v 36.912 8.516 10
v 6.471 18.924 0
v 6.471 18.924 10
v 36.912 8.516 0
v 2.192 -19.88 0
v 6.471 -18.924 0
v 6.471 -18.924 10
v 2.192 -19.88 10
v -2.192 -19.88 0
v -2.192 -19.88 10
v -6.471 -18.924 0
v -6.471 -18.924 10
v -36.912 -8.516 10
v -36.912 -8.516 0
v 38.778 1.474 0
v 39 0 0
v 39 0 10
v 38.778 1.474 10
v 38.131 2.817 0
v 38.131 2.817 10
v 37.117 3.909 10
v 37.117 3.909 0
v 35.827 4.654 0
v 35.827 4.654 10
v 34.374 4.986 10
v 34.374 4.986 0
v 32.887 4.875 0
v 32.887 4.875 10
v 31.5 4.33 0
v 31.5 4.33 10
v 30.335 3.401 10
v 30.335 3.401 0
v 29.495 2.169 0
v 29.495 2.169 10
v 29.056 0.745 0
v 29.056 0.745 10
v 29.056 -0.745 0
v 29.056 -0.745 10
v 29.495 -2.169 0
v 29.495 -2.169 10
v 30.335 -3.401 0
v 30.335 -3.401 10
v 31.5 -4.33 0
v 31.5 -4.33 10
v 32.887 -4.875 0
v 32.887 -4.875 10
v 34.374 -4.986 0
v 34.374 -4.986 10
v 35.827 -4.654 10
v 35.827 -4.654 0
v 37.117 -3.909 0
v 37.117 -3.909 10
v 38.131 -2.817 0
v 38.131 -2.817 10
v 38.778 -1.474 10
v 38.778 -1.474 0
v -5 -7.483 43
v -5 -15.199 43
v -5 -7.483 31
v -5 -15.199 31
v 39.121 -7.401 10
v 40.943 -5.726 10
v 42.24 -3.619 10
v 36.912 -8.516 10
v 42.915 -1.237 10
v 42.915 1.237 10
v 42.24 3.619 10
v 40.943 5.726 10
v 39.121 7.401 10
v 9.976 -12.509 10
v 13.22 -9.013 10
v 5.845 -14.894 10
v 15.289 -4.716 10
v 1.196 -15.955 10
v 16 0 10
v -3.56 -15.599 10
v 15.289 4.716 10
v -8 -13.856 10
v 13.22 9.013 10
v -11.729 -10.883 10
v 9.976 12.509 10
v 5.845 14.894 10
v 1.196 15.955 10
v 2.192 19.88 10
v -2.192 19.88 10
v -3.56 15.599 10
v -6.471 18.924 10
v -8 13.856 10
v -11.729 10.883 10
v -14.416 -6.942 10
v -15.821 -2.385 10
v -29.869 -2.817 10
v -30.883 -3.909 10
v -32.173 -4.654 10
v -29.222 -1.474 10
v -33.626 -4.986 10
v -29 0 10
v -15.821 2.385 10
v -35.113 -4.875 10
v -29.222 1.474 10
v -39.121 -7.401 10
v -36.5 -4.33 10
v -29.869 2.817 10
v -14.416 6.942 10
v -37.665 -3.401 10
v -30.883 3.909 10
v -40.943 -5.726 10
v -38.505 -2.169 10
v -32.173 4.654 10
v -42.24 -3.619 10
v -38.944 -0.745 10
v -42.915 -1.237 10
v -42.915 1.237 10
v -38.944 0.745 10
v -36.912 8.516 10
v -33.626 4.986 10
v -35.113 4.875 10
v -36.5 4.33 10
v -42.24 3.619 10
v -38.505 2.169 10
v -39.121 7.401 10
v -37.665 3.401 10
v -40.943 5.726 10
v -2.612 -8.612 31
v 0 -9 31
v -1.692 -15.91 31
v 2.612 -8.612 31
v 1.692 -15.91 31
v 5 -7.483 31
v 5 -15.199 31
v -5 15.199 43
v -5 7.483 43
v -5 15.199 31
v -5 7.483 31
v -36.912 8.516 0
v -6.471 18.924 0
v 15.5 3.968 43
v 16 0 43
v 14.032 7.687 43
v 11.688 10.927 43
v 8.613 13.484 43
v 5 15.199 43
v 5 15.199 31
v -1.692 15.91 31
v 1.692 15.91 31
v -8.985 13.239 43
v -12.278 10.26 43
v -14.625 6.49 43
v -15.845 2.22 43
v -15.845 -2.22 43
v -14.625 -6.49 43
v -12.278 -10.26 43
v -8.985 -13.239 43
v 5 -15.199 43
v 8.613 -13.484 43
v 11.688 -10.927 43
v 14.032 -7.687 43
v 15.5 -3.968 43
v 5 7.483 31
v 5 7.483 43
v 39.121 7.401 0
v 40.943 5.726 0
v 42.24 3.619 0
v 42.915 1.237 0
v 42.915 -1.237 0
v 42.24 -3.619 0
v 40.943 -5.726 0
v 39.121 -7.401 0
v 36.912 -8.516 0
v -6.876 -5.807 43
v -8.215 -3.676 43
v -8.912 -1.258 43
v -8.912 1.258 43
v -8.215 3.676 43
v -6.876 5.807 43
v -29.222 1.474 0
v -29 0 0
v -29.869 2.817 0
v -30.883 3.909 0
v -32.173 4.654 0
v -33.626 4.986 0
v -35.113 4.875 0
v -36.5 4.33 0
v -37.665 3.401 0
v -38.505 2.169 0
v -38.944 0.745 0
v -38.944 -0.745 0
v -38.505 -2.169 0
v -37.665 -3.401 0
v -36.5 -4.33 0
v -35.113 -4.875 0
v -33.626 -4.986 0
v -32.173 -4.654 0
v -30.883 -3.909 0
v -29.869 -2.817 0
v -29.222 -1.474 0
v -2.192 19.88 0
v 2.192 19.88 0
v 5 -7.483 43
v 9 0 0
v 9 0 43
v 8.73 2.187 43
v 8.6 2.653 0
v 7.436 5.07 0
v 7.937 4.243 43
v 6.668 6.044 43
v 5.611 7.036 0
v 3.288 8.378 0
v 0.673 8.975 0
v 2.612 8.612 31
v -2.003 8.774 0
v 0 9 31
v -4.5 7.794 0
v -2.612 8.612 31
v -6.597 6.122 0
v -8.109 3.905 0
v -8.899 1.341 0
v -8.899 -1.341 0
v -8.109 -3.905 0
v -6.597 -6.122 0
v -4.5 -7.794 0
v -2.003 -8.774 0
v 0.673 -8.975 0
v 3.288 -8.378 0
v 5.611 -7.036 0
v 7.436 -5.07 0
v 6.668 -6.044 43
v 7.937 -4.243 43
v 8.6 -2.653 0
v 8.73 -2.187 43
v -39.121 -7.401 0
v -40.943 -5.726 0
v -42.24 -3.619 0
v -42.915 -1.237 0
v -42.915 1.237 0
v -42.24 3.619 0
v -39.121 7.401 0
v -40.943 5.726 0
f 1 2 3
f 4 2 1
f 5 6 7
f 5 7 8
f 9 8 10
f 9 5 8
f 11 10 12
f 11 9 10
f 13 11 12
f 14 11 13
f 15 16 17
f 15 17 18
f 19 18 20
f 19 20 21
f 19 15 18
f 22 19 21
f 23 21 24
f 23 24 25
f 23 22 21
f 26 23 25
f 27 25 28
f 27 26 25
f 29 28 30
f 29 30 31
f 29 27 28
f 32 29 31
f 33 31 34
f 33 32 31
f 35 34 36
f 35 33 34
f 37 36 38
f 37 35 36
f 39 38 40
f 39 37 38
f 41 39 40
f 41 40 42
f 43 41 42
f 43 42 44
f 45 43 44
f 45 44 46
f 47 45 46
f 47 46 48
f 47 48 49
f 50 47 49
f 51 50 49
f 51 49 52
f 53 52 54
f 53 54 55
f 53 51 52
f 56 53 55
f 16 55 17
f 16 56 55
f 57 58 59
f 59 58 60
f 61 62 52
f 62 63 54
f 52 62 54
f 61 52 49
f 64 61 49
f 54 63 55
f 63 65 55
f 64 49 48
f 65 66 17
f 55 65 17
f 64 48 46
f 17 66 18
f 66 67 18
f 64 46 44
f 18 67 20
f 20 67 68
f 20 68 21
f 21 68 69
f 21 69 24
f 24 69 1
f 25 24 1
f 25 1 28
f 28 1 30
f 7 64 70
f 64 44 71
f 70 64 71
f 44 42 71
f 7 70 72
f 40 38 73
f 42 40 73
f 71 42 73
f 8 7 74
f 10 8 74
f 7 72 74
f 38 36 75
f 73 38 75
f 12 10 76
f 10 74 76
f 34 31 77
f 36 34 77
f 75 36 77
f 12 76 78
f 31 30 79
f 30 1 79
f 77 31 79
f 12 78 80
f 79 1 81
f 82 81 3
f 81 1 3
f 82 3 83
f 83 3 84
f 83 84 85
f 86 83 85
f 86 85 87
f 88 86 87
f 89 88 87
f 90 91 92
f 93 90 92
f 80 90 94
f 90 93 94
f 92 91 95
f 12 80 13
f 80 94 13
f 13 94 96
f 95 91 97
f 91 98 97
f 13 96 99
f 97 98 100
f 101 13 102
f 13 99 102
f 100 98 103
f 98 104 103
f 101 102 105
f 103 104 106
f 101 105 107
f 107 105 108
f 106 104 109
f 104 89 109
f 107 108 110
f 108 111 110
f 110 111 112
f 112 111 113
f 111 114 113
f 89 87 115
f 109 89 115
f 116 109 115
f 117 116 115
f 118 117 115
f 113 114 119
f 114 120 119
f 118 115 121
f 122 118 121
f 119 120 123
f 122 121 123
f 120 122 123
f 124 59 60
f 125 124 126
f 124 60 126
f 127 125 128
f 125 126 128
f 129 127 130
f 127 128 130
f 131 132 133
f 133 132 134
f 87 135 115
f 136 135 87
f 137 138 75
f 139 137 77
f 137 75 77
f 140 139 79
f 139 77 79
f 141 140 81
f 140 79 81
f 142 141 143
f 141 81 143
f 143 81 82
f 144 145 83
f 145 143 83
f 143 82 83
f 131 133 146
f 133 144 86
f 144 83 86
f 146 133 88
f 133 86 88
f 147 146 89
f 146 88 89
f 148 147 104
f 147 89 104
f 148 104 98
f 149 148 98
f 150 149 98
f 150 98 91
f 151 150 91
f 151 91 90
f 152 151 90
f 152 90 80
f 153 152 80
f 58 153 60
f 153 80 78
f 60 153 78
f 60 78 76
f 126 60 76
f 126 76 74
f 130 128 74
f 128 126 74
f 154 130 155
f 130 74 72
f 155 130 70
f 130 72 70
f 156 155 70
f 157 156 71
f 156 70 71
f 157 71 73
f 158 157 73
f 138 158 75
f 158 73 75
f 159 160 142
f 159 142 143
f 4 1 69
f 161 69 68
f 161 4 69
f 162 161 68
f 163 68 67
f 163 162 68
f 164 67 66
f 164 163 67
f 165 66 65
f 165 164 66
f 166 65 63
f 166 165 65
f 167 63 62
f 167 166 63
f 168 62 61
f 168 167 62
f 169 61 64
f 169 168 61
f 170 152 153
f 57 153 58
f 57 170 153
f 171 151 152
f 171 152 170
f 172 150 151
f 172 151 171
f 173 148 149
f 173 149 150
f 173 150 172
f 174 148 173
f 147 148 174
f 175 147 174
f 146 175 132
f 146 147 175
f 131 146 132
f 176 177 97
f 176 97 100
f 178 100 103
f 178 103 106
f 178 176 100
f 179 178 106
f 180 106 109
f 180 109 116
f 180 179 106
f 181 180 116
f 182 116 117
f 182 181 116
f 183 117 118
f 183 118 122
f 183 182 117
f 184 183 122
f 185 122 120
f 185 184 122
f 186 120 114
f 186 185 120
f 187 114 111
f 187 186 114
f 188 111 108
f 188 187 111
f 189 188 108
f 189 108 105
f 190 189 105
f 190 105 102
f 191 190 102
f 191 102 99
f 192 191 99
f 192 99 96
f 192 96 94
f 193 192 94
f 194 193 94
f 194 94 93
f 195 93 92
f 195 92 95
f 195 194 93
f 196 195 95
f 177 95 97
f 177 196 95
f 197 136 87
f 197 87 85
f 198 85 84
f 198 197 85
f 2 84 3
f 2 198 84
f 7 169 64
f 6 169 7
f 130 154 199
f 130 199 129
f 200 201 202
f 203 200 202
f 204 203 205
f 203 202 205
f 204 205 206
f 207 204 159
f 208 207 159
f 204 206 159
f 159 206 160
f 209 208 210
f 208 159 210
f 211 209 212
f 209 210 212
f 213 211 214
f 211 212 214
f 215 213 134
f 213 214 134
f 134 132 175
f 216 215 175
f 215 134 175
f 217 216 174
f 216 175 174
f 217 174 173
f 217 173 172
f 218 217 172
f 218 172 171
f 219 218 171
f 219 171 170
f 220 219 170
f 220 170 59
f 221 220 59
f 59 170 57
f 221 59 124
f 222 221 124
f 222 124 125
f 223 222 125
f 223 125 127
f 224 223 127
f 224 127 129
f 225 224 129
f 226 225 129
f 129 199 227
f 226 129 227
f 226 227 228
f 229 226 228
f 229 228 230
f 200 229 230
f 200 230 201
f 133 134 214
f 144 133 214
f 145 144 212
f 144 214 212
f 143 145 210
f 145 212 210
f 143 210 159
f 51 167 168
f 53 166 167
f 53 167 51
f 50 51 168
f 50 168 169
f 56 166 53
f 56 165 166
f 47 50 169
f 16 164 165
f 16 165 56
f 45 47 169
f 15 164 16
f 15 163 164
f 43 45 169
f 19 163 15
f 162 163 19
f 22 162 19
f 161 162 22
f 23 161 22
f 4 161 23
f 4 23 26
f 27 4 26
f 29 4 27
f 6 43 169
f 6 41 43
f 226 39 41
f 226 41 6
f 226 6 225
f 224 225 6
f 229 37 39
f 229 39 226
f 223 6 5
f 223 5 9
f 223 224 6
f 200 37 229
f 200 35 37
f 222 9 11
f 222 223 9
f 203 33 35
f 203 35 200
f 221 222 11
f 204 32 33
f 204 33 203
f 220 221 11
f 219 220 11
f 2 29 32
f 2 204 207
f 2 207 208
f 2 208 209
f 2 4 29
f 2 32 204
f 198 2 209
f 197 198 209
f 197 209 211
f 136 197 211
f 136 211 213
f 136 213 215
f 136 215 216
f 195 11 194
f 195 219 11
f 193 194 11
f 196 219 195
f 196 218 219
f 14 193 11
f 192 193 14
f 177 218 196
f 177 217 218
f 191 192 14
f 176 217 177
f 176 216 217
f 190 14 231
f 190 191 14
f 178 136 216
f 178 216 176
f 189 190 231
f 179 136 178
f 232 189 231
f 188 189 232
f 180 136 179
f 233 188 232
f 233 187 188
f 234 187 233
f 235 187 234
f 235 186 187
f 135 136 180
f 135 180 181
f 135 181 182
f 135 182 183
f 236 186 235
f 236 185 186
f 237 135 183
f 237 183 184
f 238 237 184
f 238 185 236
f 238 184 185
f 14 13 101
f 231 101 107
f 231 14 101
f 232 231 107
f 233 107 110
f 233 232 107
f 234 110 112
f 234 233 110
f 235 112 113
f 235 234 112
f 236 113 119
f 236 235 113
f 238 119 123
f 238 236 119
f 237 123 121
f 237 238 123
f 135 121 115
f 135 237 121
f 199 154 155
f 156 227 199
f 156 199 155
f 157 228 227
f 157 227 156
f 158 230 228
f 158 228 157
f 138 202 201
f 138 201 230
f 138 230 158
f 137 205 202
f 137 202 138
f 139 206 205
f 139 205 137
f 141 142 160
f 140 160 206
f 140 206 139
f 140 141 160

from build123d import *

# Parameters (mm, degrees)
EXTRUDE_1_DEPTH          = 10
SKETCH_3_R               = 5
CUT_EXTRUDE_1_DEPTH      = 10
SKETCH_4_R               = 16
EXTRUDE_2_DEPTH          = 33
SKETCH_5_R               = 9
CUT_EXTRUDE_2_DEPTH      = 89
CUT_EXTRUDE_3_DEPTH      = 89
CUT_EXTRUDE_3_DEPTH_BACK = 89
SKETCH_6_W               = 10
SKETCH_6_H               = 12


with BuildPart() as part:
    # 草图1 → 凸台-拉伸1 (new body)
    with BuildSketch(Plane.XY):
        with BuildLine():
            Line((-36.911764706, 8.515963028), (-6.470588235, 18.924362285))
            ThreePointArc((-6.470588235, 18.924362285), (0, 20), (6.470588235, 18.924362285))
            Line((6.470588235, 18.924362285), (36.911764706, 8.515963028))
            ThreePointArc((36.911764706, 8.515963028), (43, 0), (36.911764706, -8.515963028))
            Line((36.911764706, -8.515963028), (6.470588235, -18.924362285))
            ThreePointArc((6.470588235, -18.924362285), (0, -20), (-6.470588235, -18.924362285))
            Line((-6.470588235, -18.924362285), (-36.911764706, -8.515963028))
            ThreePointArc((-36.911764706, -8.515963028), (-43, 0), (-36.911764706, 8.515963028))
        make_face()
    extrude(amount=EXTRUDE_1_DEPTH)

    # 草图3 → 切除-拉伸1 (cut)
    with BuildSketch(Plane.XY):
        with Locations((-34, 0)):
            Circle(SKETCH_3_R)
        with Locations((34, 0)):
            Circle(SKETCH_3_R)
    extrude(amount=CUT_EXTRUDE_1_DEPTH, mode=Mode.SUBTRACT)

    # 草图4 → 凸台-拉伸2 (add)
    with BuildSketch(Plane.XY.offset(10)):
        Circle(SKETCH_4_R)
    extrude(amount=EXTRUDE_2_DEPTH)

    # 草图5 → 切除-拉伸2 (cut)
    with BuildSketch(Plane.XY.offset(43)):
        Circle(SKETCH_5_R)
    extrude(amount=-CUT_EXTRUDE_2_DEPTH, mode=Mode.SUBTRACT)

    # 草图6 → 切除-拉伸3 (cut, two sides: drawn at the far end of the back side and taken through both)
    with BuildSketch(Plane(origin=(0, 0, 0), x_dir=(1, 0, 0), z_dir=(0, 1, 0)).offset(-CUT_EXTRUDE_3_DEPTH_BACK)):
        with Locations((0, -37)):
            Rectangle(SKETCH_6_W, SKETCH_6_H)
    extrude(amount=CUT_EXTRUDE_3_DEPTH + CUT_EXTRUDE_3_DEPTH_BACK, mode=Mode.SUBTRACT)


solid = part.part
